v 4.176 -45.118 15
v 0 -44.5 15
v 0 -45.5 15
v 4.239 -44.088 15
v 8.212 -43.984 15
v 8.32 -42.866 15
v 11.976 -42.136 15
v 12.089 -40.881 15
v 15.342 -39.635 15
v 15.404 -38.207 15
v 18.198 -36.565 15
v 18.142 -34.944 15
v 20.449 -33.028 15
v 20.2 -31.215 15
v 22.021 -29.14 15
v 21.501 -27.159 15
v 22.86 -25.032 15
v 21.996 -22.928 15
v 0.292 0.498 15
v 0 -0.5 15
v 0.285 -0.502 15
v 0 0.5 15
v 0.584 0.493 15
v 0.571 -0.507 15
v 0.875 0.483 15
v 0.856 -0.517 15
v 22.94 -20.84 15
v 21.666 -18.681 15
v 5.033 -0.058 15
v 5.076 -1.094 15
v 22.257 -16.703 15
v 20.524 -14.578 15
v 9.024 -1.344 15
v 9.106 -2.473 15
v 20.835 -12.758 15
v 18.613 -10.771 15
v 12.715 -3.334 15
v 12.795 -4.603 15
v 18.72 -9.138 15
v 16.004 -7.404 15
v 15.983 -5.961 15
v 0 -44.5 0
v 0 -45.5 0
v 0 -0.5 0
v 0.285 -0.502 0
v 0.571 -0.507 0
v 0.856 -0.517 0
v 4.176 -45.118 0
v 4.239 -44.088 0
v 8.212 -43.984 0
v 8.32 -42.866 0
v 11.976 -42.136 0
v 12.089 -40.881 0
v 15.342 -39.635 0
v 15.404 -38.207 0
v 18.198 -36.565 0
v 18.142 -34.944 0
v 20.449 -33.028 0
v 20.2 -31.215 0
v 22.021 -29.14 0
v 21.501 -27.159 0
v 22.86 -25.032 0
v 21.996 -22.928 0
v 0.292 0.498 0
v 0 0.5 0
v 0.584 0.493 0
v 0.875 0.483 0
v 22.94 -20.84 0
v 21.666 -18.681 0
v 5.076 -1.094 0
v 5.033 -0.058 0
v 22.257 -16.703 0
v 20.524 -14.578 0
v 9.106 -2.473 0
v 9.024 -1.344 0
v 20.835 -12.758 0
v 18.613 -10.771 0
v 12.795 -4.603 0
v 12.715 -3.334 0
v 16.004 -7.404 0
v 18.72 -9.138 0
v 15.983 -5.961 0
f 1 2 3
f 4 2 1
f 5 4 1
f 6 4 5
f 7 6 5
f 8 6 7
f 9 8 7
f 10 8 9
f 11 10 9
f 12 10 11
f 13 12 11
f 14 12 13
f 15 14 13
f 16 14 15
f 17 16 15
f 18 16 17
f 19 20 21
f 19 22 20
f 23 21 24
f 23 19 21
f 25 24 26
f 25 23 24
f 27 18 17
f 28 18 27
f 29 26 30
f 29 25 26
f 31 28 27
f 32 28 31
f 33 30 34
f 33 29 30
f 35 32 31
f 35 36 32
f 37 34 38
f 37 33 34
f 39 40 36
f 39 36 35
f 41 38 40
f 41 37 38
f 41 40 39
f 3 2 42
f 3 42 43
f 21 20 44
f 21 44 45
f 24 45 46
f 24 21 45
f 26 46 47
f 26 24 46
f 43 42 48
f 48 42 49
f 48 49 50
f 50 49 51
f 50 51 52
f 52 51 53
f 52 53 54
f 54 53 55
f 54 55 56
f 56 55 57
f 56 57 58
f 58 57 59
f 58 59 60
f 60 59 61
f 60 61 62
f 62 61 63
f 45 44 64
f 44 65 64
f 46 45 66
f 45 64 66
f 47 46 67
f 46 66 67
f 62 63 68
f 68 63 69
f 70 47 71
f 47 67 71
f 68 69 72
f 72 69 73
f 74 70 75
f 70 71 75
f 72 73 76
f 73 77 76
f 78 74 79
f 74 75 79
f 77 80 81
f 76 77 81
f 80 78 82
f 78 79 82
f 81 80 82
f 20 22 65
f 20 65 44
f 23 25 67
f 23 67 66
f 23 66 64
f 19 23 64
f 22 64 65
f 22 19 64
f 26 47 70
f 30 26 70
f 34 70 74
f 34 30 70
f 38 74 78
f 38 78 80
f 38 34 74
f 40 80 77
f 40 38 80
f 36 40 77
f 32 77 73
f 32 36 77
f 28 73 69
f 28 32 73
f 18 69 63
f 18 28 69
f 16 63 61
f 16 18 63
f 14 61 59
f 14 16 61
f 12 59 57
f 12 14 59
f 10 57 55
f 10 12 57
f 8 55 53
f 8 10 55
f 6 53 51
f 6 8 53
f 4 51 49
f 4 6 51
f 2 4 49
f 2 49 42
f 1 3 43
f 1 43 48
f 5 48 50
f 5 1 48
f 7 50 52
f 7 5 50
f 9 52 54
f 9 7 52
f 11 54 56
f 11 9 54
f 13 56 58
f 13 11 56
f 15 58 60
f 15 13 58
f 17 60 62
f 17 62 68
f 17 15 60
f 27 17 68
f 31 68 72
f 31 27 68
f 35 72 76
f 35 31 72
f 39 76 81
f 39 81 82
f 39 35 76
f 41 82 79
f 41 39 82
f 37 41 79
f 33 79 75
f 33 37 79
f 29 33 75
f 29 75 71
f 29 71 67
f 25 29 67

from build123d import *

# Parameters (mm, degrees)
SKETCH_1_R          = 1
EXTRUDE_1_DEPTH     = 15
EXTRUDE_2_DEPTH     = 15
CUT_EXTRUDE_1_DEPTH = 16


with BuildPart() as part:
    # ｽｹｯﾁ1 → ﾎﾞｽ - 押し出し1 (new body)
    with BuildSketch(Plane.XY):
        Circle(SKETCH_1_R)
    extrude(amount=EXTRUDE_1_DEPTH)

    # ｽｹｯﾁ2 → ﾎﾞｽ - 押し出し2 (add)
    with BuildSketch(Plane.XY.offset(15)):
        with BuildLine():
            Line((0, -44.5), (0, -45.5))
            ThreePointArc((0, -45.5), (23, -22.5), (0, 0.5))
            Line((0, 0.5), (0, -0.5))
            ThreePointArc((0, -0.5), (22, -22.5), (0, -44.5))
        make_face()
    extrude(amount=-EXTRUDE_2_DEPTH)

    # ｽｹｯﾁ6 → ｶｯﾄ - 押し出し1 (cut, through all)
    with BuildSketch(Plane.XY.offset(15)):
        with BuildLine():
            Line((0, 0.5), (0, -0.5))
            ThreePointArc((0, -0.5), (0.428174419, -0.504167061), (0.856186636, -0.516666667))
            Line((0.856186636, -0.516666667), (0.856186636, -1.684394884))
            Line((0.856186636, -1.684394884), (-3.351649942, -1.684394884))
            Line((-3.351649942, -1.684394884), (-3.351649942, 1.730475854))
            Line((-3.351649942, 1.730475854), (0.875436399, 1.730475854))
            Line((0.875436399, 1.730475854), (0.875436399, 0.483333333))
            ThreePointArc((0.875436399, 0.483333333), (0.437797518, 0.495832956), (0, 0.5))
        make_face()
    extrude(amount=-CUT_EXTRUDE_1_DEPTH, mode=Mode.SUBTRACT)


solid = part.part
